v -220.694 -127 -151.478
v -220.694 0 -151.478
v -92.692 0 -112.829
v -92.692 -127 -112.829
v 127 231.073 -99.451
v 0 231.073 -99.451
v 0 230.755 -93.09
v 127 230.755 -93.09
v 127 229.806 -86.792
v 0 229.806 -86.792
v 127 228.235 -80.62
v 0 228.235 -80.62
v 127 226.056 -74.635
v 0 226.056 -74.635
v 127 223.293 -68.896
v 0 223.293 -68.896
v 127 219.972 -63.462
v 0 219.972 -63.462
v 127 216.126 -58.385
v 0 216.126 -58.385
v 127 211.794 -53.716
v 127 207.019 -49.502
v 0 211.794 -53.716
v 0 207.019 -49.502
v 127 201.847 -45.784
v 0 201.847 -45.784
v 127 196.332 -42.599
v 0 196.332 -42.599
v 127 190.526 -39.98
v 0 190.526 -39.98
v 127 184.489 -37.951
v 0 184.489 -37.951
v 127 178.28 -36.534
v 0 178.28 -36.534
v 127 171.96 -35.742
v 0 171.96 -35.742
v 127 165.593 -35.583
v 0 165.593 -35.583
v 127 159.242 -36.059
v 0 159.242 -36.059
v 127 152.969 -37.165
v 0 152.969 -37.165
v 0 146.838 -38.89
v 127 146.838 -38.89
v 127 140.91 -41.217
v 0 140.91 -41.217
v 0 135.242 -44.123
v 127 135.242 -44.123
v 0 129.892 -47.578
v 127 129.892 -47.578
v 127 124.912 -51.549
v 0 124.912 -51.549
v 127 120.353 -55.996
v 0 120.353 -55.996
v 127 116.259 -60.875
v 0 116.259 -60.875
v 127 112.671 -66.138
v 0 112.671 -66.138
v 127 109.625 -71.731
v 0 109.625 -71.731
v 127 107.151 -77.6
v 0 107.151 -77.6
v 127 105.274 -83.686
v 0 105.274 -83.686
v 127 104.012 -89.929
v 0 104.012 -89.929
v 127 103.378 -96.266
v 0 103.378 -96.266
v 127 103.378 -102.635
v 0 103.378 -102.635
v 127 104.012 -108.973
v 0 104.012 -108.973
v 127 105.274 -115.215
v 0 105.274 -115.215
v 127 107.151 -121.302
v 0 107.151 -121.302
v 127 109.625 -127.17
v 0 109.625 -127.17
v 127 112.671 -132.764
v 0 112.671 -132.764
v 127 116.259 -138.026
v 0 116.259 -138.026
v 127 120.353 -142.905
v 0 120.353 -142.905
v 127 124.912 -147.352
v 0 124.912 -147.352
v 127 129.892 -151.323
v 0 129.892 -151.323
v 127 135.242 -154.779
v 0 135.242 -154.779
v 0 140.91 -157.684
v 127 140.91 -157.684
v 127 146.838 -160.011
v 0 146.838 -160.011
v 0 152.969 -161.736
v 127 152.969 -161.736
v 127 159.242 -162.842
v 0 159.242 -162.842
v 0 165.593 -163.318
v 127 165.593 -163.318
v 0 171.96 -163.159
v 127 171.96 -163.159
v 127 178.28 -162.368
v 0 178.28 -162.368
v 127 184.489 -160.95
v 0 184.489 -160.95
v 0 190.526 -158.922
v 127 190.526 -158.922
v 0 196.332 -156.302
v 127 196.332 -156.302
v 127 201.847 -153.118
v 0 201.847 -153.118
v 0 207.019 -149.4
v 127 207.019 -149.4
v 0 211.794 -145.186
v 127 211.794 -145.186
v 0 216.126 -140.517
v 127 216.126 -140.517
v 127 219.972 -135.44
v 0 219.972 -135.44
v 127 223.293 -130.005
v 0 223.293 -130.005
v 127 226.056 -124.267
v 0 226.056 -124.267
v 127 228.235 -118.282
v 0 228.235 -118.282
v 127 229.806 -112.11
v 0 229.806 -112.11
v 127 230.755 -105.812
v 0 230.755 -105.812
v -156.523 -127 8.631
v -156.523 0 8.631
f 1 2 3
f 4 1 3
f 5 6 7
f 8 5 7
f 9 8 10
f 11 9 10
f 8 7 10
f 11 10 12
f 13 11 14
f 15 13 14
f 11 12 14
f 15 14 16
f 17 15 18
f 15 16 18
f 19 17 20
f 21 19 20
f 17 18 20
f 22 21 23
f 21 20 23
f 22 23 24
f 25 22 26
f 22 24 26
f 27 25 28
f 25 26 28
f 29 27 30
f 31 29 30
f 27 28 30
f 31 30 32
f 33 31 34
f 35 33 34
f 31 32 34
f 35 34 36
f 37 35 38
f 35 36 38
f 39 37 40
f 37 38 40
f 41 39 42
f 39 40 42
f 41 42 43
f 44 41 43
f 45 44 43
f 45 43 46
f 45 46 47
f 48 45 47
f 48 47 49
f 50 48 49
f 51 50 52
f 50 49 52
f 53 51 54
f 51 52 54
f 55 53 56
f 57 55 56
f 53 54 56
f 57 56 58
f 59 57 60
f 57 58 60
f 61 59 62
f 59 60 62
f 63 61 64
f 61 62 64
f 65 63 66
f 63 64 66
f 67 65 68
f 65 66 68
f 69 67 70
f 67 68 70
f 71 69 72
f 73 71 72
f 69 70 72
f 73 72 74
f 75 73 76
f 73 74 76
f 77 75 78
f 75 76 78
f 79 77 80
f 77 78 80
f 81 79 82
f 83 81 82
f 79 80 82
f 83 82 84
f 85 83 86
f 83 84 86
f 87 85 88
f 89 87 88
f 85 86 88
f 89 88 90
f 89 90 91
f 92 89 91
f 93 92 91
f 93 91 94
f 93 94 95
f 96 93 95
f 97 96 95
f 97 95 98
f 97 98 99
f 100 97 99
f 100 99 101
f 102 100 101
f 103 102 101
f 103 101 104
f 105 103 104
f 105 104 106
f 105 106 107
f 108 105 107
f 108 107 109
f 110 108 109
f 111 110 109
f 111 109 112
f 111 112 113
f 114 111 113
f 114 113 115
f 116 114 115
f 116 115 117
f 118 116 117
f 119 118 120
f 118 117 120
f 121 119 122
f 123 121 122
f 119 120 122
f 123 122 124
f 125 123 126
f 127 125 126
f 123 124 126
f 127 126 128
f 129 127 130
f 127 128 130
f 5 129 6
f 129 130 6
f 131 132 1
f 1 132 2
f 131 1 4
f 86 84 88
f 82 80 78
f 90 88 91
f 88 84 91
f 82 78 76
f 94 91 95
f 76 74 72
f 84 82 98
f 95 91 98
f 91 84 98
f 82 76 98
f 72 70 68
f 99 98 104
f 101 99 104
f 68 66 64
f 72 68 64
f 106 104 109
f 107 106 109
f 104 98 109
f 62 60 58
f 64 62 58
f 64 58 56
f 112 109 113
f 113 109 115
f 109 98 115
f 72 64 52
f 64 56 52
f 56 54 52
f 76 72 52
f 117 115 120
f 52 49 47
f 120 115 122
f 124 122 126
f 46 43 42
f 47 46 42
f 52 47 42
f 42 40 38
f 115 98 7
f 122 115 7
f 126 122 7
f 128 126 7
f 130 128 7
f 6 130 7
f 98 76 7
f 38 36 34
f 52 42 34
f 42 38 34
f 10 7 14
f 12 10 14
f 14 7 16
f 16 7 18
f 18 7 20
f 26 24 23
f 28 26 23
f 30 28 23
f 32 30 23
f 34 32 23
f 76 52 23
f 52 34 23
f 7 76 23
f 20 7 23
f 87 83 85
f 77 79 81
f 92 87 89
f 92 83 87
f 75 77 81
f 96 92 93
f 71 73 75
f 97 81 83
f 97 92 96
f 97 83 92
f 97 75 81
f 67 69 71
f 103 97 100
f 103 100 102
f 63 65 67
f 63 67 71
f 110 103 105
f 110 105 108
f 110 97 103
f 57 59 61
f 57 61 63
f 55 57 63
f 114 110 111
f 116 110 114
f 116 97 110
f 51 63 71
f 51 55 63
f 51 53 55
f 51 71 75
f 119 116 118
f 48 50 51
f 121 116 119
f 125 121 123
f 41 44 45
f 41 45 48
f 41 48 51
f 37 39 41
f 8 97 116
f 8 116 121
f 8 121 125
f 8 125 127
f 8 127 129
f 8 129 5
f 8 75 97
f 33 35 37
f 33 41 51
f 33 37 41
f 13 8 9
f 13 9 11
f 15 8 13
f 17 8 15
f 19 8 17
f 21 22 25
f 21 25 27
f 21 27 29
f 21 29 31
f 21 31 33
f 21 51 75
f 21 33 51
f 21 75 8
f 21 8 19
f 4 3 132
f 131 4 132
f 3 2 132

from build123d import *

# Parameters (mm, degrees)
F1_DEPTH = 127
F2_R     = 63.88728
F3_DEPTH = 127


with BuildPart() as f1:
    # F0 (on Front) → F1 (new body)
    with BuildSketch(Plane.XZ):
        Polygon((-156.523347, 8.631107), (-220.694497, -151.477531), (-92.69169, -112.82865), align=None)
    extrude(amount=F1_DEPTH)


with BuildPart() as f3:
    # F2 (on Right) → F3 (new body)
    with BuildSketch(Plane.YZ):
        with Locations((167.185634, -99.450827)):
            Circle(F2_R)
    extrude(amount=F3_DEPTH)


solid = Compound([f1.part, f3.part])
